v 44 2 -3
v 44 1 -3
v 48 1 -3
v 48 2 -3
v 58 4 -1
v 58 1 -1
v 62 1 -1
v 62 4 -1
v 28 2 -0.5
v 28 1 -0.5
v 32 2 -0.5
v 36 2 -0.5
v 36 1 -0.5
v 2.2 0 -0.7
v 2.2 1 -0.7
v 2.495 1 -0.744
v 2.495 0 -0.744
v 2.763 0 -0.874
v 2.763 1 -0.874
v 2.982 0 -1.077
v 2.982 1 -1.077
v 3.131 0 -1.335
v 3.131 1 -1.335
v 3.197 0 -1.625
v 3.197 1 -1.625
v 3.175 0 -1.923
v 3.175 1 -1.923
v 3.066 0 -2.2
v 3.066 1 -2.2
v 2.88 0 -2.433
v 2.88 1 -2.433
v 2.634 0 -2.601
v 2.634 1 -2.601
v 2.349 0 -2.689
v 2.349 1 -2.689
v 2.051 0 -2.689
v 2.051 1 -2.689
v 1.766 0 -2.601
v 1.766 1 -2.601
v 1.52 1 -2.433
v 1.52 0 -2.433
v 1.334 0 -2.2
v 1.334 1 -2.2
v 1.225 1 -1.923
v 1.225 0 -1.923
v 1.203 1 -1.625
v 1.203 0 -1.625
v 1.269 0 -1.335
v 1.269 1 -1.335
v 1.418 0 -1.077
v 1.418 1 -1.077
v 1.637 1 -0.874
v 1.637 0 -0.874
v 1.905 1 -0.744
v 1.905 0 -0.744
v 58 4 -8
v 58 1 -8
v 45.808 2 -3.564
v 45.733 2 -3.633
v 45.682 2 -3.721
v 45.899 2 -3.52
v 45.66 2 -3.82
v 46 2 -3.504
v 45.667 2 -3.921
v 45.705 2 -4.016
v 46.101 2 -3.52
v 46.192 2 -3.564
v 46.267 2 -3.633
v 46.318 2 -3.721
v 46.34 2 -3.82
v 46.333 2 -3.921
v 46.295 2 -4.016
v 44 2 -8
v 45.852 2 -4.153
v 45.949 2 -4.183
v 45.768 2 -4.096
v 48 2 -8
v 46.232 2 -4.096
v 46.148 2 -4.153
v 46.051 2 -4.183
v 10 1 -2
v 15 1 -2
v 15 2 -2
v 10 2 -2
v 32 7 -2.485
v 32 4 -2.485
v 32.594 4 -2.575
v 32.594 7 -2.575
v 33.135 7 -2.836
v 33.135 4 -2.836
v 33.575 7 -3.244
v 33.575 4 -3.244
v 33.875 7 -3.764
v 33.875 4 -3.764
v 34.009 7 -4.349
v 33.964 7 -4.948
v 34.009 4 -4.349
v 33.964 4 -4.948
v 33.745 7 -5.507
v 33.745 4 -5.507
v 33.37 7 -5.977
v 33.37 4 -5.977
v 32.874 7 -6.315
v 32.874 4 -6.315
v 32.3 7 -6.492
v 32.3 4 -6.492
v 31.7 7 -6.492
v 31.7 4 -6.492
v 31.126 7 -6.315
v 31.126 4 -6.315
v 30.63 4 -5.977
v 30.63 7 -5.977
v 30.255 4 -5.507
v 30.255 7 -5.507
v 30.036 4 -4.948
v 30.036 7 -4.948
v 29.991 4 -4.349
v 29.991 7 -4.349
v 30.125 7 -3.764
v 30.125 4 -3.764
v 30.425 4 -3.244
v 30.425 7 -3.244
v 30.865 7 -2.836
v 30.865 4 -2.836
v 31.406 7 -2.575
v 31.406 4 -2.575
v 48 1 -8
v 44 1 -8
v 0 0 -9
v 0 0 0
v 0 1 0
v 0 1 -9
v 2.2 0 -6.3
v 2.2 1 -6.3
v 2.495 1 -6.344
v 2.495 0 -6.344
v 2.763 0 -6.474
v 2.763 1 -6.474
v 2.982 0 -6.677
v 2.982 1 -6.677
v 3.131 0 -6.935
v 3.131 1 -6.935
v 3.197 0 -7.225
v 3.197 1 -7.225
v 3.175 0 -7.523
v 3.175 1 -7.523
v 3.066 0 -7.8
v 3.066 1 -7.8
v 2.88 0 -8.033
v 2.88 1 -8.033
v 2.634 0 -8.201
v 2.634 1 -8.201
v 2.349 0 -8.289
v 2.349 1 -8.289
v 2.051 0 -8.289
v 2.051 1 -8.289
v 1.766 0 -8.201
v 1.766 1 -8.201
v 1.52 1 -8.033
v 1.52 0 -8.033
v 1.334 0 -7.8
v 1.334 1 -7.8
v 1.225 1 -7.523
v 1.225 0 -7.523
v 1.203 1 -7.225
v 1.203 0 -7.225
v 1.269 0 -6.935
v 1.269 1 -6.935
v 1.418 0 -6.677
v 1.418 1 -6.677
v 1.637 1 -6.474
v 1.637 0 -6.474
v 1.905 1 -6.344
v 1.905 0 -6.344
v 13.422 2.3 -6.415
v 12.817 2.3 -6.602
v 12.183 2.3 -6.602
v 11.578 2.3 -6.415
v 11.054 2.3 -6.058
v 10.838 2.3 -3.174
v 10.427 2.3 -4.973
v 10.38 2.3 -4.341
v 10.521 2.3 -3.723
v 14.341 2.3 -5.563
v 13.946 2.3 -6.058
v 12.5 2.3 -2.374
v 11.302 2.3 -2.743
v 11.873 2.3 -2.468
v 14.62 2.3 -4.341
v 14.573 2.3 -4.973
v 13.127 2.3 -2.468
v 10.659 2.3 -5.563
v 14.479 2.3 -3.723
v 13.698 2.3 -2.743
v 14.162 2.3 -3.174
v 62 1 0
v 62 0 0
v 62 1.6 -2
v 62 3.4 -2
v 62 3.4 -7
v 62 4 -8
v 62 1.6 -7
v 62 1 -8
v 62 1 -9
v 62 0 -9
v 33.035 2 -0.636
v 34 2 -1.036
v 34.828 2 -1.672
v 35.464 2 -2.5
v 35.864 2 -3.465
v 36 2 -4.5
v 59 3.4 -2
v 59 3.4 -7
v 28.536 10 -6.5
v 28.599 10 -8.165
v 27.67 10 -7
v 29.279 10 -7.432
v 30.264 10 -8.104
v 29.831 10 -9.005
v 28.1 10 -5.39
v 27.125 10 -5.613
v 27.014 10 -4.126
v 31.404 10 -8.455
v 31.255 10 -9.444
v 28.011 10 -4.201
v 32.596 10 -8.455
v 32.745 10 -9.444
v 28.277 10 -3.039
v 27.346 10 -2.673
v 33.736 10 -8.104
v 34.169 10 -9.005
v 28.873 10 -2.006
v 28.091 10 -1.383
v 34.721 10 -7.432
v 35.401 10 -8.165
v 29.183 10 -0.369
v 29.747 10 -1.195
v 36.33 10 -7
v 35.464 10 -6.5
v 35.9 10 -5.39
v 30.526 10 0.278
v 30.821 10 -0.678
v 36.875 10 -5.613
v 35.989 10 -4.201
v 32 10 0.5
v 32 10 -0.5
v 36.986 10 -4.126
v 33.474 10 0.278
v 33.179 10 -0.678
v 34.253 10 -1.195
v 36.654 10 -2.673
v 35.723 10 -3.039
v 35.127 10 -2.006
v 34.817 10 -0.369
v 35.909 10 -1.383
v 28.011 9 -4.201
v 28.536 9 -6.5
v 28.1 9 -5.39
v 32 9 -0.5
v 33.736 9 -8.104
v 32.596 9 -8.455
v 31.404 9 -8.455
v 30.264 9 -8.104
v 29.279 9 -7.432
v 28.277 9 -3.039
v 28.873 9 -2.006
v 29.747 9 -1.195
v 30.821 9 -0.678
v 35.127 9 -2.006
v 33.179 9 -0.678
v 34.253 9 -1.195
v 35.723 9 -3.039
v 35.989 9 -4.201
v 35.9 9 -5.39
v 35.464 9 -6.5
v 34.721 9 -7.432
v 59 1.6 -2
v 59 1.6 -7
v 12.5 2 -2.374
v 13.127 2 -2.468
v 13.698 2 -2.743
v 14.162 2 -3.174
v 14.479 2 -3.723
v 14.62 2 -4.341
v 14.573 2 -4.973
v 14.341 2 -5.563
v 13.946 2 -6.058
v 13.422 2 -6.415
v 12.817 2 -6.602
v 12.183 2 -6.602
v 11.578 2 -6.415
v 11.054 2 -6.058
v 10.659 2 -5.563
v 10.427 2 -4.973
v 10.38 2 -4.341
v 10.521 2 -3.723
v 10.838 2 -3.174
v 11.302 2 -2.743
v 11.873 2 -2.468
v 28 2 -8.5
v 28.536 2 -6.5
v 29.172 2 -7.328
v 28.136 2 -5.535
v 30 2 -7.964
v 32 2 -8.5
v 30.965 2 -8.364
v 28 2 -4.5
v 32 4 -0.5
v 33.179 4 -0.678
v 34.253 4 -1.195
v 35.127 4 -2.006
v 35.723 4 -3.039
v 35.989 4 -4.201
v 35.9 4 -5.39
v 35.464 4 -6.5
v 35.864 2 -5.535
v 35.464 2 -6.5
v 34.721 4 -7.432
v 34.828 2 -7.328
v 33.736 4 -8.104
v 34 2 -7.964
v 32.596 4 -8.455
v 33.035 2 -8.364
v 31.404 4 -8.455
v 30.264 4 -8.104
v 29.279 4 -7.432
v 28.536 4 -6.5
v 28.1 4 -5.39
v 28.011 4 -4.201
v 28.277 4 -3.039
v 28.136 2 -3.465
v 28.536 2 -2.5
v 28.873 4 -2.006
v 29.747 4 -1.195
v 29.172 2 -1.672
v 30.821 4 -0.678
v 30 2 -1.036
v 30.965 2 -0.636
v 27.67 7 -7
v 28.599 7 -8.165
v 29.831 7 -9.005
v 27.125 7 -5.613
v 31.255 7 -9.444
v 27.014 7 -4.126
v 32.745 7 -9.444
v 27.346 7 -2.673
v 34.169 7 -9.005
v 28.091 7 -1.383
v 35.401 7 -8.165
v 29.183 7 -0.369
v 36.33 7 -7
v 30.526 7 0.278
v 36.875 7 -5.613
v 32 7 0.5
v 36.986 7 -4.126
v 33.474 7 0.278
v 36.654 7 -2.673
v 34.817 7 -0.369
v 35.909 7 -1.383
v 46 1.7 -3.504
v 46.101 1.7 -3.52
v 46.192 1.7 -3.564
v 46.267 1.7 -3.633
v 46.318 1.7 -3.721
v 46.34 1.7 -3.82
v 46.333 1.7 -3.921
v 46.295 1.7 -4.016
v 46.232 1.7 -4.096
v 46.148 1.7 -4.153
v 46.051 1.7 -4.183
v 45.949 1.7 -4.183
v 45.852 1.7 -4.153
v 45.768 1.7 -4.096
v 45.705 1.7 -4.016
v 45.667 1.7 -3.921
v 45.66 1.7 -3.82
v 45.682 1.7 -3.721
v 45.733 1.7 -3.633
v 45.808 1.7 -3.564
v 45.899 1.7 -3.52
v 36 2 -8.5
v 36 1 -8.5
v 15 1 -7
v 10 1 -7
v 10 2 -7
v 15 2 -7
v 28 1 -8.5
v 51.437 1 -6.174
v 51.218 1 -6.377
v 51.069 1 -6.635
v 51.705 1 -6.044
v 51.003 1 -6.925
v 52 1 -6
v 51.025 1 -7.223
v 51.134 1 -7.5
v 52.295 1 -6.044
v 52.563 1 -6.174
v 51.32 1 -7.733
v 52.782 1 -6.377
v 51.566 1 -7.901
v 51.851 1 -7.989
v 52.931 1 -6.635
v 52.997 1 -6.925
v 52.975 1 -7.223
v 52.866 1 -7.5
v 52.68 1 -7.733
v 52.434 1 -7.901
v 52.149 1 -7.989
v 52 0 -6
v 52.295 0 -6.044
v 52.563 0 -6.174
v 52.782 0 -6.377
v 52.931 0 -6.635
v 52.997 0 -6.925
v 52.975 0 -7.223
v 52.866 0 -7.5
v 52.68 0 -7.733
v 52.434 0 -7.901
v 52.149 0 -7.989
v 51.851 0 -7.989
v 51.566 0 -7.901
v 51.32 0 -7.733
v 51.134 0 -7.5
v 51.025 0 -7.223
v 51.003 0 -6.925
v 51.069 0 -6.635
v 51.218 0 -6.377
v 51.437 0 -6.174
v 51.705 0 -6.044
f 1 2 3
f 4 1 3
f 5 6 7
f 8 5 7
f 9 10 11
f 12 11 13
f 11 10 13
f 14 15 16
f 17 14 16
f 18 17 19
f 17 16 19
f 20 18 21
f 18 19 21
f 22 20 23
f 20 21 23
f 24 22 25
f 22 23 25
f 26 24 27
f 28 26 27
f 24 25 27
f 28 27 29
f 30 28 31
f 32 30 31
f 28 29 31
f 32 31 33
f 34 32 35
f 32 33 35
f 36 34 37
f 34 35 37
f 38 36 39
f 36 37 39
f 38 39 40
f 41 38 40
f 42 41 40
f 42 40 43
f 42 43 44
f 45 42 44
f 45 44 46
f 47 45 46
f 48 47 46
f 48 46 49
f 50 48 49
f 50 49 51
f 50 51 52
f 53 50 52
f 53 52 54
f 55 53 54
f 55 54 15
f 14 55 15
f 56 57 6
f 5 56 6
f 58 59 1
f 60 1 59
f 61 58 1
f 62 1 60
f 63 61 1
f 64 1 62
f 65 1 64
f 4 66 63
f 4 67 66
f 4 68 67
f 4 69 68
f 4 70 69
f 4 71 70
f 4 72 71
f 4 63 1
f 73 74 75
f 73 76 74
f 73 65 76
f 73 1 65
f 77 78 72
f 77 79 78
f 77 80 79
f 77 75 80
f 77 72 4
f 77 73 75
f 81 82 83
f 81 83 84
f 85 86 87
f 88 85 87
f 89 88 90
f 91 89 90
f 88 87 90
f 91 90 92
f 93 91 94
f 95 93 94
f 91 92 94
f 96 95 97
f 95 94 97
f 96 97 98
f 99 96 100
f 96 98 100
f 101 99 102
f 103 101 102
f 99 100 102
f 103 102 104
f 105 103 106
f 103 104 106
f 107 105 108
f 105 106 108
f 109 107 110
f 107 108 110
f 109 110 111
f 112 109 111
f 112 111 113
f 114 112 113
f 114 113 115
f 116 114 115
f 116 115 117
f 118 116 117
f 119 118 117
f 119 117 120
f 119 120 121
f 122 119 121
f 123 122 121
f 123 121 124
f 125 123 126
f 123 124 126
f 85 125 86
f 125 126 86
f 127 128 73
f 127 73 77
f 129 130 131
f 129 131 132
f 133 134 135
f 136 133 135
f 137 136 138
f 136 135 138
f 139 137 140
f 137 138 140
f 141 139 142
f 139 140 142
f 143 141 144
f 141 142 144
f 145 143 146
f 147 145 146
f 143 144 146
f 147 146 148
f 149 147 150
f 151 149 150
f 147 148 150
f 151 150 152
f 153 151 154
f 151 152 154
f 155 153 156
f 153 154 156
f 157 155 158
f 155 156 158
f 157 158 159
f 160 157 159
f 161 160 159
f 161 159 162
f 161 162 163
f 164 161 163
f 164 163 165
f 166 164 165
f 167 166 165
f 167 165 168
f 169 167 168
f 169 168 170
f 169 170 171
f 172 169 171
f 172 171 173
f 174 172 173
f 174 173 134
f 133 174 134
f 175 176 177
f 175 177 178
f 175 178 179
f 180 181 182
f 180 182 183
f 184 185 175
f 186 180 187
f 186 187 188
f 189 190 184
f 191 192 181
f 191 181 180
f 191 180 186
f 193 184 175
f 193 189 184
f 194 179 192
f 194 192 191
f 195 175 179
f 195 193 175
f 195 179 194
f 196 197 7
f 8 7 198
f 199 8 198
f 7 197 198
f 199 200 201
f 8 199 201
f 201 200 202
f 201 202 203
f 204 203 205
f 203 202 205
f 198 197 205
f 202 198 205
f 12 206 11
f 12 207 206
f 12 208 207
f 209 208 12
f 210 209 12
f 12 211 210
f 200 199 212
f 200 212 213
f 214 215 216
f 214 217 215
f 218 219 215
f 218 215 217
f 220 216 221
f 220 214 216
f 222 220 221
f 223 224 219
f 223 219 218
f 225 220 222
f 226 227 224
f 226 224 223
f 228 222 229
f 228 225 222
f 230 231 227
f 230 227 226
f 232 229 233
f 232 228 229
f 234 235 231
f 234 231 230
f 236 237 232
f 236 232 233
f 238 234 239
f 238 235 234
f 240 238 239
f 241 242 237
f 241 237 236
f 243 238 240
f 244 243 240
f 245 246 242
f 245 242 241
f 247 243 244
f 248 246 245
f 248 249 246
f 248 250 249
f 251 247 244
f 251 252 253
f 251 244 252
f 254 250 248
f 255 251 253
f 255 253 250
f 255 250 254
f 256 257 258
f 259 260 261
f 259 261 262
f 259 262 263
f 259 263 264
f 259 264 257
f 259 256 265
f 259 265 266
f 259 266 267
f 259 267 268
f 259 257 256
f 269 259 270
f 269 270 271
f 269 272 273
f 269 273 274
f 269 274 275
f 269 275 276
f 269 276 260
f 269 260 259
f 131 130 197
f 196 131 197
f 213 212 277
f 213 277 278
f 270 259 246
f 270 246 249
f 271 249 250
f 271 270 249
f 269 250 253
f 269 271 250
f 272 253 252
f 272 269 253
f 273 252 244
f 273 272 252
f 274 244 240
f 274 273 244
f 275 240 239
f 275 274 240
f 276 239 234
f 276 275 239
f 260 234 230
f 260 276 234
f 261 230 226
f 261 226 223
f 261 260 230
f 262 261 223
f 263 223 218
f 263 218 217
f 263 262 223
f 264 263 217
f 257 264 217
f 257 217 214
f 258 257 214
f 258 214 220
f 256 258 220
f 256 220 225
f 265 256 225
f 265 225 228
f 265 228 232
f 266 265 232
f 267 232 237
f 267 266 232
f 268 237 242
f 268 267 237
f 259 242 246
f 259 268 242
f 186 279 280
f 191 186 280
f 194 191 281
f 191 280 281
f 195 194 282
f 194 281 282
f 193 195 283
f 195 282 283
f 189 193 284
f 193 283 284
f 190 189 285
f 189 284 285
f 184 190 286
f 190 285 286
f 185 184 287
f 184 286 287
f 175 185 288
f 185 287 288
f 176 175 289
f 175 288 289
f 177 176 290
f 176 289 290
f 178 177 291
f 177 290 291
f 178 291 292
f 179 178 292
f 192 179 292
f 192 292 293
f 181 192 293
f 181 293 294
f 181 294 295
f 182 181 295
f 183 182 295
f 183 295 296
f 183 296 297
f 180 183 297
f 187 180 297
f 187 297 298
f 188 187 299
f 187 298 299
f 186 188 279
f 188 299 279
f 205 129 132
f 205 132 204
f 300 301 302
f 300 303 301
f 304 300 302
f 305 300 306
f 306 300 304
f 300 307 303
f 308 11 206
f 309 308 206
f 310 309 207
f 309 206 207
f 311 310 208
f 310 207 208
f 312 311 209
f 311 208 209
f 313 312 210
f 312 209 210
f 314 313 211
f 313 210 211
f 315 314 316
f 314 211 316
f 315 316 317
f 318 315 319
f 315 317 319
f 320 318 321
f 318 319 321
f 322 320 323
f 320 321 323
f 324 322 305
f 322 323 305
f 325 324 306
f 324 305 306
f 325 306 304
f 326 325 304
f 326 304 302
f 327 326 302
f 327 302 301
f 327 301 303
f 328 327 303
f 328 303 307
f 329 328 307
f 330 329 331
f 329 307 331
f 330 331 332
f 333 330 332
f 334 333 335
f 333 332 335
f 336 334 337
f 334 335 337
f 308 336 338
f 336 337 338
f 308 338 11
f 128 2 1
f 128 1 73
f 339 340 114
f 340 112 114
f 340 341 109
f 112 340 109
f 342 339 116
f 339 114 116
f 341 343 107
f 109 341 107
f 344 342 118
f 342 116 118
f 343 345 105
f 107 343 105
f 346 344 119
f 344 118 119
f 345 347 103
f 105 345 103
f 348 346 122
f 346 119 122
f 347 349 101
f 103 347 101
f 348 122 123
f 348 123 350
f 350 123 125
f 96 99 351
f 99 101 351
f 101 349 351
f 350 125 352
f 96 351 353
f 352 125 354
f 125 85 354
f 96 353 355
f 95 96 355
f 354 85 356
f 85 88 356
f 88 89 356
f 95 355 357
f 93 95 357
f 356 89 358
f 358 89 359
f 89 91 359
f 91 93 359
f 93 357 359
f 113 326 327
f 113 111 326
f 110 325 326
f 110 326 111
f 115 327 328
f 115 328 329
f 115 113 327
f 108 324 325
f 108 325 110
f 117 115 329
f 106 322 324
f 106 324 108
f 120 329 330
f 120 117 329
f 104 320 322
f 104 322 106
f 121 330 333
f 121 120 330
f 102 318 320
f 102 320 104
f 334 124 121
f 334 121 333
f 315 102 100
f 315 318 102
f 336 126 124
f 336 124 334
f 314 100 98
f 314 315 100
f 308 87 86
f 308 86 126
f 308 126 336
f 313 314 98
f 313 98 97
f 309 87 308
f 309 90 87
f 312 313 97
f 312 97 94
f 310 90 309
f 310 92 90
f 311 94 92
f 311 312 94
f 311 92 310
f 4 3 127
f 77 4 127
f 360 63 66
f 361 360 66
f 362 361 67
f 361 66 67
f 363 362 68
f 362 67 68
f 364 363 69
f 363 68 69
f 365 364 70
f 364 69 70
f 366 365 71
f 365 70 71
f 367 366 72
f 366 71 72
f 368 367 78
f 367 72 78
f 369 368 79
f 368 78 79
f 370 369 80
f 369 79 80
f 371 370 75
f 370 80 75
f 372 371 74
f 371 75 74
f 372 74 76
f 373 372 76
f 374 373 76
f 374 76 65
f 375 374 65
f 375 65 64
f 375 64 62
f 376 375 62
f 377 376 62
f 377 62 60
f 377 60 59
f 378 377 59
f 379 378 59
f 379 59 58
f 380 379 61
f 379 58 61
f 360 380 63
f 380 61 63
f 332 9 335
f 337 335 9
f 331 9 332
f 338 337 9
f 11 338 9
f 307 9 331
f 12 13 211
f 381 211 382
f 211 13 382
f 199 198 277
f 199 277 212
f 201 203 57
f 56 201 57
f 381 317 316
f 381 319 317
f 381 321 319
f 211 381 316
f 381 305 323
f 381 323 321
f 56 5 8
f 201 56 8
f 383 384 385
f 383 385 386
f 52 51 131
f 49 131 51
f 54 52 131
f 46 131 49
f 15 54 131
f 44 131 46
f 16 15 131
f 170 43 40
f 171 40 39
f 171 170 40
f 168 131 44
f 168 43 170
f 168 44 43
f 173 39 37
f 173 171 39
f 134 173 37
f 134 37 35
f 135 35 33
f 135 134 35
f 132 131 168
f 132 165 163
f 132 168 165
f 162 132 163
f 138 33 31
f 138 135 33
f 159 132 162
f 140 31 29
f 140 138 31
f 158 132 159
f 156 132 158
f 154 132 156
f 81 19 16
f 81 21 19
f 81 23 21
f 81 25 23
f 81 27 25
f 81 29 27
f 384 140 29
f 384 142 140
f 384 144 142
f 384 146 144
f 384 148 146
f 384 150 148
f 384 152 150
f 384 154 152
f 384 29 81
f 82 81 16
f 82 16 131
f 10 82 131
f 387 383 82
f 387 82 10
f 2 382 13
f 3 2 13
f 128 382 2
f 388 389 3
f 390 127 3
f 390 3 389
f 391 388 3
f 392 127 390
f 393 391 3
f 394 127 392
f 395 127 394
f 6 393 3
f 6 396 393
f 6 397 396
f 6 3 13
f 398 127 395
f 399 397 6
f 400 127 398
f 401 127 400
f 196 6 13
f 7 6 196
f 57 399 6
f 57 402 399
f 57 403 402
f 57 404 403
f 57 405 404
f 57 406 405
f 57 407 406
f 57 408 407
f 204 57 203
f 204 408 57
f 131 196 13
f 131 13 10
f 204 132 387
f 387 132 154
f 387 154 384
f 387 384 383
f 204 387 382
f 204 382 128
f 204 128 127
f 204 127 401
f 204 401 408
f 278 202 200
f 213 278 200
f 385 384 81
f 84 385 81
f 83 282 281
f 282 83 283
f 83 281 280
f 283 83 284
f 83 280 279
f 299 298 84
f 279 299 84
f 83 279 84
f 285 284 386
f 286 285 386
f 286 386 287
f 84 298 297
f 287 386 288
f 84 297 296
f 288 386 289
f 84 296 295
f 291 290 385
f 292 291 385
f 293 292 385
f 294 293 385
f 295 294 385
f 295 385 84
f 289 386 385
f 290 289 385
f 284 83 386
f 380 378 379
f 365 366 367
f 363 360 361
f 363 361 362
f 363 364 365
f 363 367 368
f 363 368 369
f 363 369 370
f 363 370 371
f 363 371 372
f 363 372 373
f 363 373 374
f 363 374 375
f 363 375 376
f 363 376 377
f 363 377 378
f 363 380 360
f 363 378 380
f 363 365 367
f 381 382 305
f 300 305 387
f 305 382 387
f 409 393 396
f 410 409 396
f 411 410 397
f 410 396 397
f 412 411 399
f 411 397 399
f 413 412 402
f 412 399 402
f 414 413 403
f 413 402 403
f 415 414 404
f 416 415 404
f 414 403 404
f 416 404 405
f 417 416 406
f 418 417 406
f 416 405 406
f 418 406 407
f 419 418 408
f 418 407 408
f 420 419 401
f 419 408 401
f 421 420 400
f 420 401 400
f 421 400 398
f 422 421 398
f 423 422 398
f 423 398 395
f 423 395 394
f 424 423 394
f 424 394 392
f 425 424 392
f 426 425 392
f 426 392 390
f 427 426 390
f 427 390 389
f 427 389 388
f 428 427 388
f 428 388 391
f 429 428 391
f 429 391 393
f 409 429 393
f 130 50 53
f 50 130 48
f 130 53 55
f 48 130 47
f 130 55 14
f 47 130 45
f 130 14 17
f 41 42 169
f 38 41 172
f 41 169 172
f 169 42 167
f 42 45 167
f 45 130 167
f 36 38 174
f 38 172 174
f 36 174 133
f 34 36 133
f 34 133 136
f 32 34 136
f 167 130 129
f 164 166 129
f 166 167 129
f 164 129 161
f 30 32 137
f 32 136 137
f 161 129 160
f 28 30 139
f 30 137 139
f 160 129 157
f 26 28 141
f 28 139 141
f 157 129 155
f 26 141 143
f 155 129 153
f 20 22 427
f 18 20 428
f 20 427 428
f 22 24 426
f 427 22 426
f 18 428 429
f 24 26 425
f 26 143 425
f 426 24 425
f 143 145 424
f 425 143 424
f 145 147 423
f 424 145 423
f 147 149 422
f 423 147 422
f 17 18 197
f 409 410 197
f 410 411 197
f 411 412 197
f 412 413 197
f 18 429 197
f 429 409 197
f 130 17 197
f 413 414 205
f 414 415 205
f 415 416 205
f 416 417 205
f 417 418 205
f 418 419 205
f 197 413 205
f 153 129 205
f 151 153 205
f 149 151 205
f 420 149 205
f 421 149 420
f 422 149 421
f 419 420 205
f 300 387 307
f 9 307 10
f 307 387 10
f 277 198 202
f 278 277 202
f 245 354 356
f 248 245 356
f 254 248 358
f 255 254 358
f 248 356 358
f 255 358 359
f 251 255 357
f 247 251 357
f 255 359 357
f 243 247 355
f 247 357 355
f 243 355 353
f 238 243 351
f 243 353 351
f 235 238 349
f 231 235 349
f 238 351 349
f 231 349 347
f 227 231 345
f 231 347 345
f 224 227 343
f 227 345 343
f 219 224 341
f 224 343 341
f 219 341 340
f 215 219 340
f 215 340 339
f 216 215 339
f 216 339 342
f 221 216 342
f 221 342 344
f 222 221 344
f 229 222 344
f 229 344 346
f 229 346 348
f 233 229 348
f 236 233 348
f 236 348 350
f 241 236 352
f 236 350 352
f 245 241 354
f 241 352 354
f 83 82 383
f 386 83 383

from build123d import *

# Parameters (mm, degrees)
SKETCH1_W            = 62
SKETCH1_H            = 9
BOSS_EXTRUDE1_DEPTH  = 1
BOSS_EXTRUDE2_DEPTH  = 3
SKETCH3_W            = 5
SKETCH3_H            = 1.8
CUT_EXTRUDE1_DEPTH   = 3
SKETCH4_R            = 1
CUT_EXTRUDE2_DEPTH   = 63.721607122
SKETCH5_W            = 4
SKETCH5_H            = 5
BOSS_EXTRUDE4_DEPTH  = 1
BOSS_EXTRUDE5_DEPTH  = 1
SKETCH7_R            = 2.125973312
BOSS_EXTRUDE6_DEPTH  = 0.3
BOSS_EXTRUDE7_DEPTH  = 1
SKETCH9_R            = 4
BOSS_EXTRUDE8_DEPTH  = 2
SKETCH10_R           = 2.014523047
BOSS_EXTRUDE9_DEPTH  = 3
SKETCH11_R           = 5
BOSS_EXTRUDE10_DEPTH = 3
CUT_EXTRUDE3_START   = -1
SKETCH12_R           = 4
CUT_EXTRUDE3_DEPTH   = 1
SKETCH13_R           = 0.341110464
CUT_EXTRUDE4_DEPTH   = 0.3


with BuildPart() as part:
    # Sketch1 → Boss-Extrude1 (new body)
    with BuildSketch(Plane(origin=(0, 0, 0), x_dir=(1, 0, 0), z_dir=(0, 1, 0))):
        with Locations((31, 4.5)):
            Rectangle(SKETCH1_W, SKETCH1_H)
    extrude(amount=BOSS_EXTRUDE1_DEPTH)

    # Sketch2 → Boss-Extrude2 (add)
    with BuildSketch(Plane(origin=(0, 1, 0), x_dir=(1, 0, 0), z_dir=(0, 1, 0))):
        Polygon((62, 4.5), (62, 8), (58, 8), (58, 1), (62, 1), align=None)
    extrude(amount=BOSS_EXTRUDE2_DEPTH)

    # Sketch3 → Cut-Extrude1 (cut)
    with BuildSketch(Plane(origin=(62, 0, 0), x_dir=(0, 0, -1), z_dir=(1, 0, 0))):
        with Locations((4.5, 2.5)):
            Rectangle(SKETCH3_W, SKETCH3_H)
    extrude(amount=-CUT_EXTRUDE1_DEPTH, mode=Mode.SUBTRACT)

    # Sketch4 → Cut-Extrude2 (cut, through all)
    with BuildSketch(Plane(origin=(0, 1, 0), x_dir=(1, 0, 0), z_dir=(0, 1, 0))):
        with Locations(Location((2.2, 7.3, 0), (0, 0, 270))):
            Circle(SKETCH4_R)
        with Locations(Location((2.2, 1.7, 0), (0, 0, 270))):
            Circle(SKETCH4_R)
        with Locations(Location((52, 7, 0), (0, 0, 270))):
            Circle(SKETCH4_R)
    extrude(amount=-CUT_EXTRUDE2_DEPTH, mode=Mode.SUBTRACT)

    # Sketch5 → Boss-Extrude4 (add)
    with BuildSketch(Plane(origin=(0, 1, 0), x_dir=(1, 0, 0), z_dir=(0, 1, 0))):
        with Locations((46, 5.5)):
            Rectangle(SKETCH5_W, SKETCH5_H)
    extrude(amount=BOSS_EXTRUDE4_DEPTH)

    # Sketch6 → Boss-Extrude5 (add)
    with BuildSketch(Plane(origin=(0, 1, 0), x_dir=(1, 0, 0), z_dir=(0, 1, 0))):
        Polygon((10, 2), (10, 4.5), (10, 7), (15, 7), (15, 4.5), (15, 2), align=None)
    extrude(amount=BOSS_EXTRUDE5_DEPTH)

    # Sketch7 → Boss-Extrude6 (add)
    with BuildSketch(Plane(origin=(0, 2, 0), x_dir=(1, 0, 0), z_dir=(0, 1, 0))):
        with Locations(Location((12.5, 4.5, 0), (0, 0, 270))):
            Circle(SKETCH7_R)
    extrude(amount=BOSS_EXTRUDE6_DEPTH)

    # Sketch8 → Boss-Extrude7 (add)
    with BuildSketch(Plane(origin=(0, 1, 0), x_dir=(1, 0, 0), z_dir=(0, 1, 0))):
        Polygon((36, 8.5), (28, 8.5), (28, 4.5), (28, 0.5), (36, 0.5), (36, 4.5), align=None)
    extrude(amount=BOSS_EXTRUDE7_DEPTH)

    # Sketch9 → Boss-Extrude8 (add)
    with BuildSketch(Plane(origin=(0, 2, 0), x_dir=(1, 0, 0), z_dir=(0, 1, 0))):
        with Locations(Location((32, 4.5, 0), (0, 0, 270))):
            Circle(SKETCH9_R)
    extrude(amount=BOSS_EXTRUDE8_DEPTH)

    # Sketch10 → Boss-Extrude9 (add)
    with BuildSketch(Plane(origin=(0, 4, 0), x_dir=(1, 0, 0), z_dir=(0, 1, 0))):
        with Locations(Location((32, 4.5, 0), (0, 0, 270))):
            Circle(SKETCH10_R)
    extrude(amount=BOSS_EXTRUDE9_DEPTH)

    # Sketch11 → Boss-Extrude10 (add)
    with BuildSketch(Plane(origin=(0, 7, 0), x_dir=(1, 0, 0), z_dir=(0, 1, 0))):
        with Locations(Location((32, 4.5, 0), (0, 0, 270))):
            Circle(SKETCH11_R)
    extrude(amount=BOSS_EXTRUDE10_DEPTH)

    # Sketch12 → Cut-Extrude3 (cut)
    with BuildSketch(Plane(origin=(0, 10, 0), x_dir=(1, 0, 0), z_dir=(0, 1, 0)).offset(CUT_EXTRUDE3_START)):
        with Locations(Location((32, 4.5, 0), (0, 0, 270))):
            Circle(SKETCH12_R)
    extrude(amount=CUT_EXTRUDE3_DEPTH, mode=Mode.SUBTRACT)

    # Sketch13 → Cut-Extrude4 (cut)
    with BuildSketch(Plane(origin=(0, 2, 0), x_dir=(1, 0, 0), z_dir=(0, 1, 0))):
        with Locations(Location((46, 3.845478616, 0), (0, 0, 270))):
            Circle(SKETCH13_R)
    extrude(amount=-CUT_EXTRUDE4_DEPTH, mode=Mode.SUBTRACT)


solid = part.part
